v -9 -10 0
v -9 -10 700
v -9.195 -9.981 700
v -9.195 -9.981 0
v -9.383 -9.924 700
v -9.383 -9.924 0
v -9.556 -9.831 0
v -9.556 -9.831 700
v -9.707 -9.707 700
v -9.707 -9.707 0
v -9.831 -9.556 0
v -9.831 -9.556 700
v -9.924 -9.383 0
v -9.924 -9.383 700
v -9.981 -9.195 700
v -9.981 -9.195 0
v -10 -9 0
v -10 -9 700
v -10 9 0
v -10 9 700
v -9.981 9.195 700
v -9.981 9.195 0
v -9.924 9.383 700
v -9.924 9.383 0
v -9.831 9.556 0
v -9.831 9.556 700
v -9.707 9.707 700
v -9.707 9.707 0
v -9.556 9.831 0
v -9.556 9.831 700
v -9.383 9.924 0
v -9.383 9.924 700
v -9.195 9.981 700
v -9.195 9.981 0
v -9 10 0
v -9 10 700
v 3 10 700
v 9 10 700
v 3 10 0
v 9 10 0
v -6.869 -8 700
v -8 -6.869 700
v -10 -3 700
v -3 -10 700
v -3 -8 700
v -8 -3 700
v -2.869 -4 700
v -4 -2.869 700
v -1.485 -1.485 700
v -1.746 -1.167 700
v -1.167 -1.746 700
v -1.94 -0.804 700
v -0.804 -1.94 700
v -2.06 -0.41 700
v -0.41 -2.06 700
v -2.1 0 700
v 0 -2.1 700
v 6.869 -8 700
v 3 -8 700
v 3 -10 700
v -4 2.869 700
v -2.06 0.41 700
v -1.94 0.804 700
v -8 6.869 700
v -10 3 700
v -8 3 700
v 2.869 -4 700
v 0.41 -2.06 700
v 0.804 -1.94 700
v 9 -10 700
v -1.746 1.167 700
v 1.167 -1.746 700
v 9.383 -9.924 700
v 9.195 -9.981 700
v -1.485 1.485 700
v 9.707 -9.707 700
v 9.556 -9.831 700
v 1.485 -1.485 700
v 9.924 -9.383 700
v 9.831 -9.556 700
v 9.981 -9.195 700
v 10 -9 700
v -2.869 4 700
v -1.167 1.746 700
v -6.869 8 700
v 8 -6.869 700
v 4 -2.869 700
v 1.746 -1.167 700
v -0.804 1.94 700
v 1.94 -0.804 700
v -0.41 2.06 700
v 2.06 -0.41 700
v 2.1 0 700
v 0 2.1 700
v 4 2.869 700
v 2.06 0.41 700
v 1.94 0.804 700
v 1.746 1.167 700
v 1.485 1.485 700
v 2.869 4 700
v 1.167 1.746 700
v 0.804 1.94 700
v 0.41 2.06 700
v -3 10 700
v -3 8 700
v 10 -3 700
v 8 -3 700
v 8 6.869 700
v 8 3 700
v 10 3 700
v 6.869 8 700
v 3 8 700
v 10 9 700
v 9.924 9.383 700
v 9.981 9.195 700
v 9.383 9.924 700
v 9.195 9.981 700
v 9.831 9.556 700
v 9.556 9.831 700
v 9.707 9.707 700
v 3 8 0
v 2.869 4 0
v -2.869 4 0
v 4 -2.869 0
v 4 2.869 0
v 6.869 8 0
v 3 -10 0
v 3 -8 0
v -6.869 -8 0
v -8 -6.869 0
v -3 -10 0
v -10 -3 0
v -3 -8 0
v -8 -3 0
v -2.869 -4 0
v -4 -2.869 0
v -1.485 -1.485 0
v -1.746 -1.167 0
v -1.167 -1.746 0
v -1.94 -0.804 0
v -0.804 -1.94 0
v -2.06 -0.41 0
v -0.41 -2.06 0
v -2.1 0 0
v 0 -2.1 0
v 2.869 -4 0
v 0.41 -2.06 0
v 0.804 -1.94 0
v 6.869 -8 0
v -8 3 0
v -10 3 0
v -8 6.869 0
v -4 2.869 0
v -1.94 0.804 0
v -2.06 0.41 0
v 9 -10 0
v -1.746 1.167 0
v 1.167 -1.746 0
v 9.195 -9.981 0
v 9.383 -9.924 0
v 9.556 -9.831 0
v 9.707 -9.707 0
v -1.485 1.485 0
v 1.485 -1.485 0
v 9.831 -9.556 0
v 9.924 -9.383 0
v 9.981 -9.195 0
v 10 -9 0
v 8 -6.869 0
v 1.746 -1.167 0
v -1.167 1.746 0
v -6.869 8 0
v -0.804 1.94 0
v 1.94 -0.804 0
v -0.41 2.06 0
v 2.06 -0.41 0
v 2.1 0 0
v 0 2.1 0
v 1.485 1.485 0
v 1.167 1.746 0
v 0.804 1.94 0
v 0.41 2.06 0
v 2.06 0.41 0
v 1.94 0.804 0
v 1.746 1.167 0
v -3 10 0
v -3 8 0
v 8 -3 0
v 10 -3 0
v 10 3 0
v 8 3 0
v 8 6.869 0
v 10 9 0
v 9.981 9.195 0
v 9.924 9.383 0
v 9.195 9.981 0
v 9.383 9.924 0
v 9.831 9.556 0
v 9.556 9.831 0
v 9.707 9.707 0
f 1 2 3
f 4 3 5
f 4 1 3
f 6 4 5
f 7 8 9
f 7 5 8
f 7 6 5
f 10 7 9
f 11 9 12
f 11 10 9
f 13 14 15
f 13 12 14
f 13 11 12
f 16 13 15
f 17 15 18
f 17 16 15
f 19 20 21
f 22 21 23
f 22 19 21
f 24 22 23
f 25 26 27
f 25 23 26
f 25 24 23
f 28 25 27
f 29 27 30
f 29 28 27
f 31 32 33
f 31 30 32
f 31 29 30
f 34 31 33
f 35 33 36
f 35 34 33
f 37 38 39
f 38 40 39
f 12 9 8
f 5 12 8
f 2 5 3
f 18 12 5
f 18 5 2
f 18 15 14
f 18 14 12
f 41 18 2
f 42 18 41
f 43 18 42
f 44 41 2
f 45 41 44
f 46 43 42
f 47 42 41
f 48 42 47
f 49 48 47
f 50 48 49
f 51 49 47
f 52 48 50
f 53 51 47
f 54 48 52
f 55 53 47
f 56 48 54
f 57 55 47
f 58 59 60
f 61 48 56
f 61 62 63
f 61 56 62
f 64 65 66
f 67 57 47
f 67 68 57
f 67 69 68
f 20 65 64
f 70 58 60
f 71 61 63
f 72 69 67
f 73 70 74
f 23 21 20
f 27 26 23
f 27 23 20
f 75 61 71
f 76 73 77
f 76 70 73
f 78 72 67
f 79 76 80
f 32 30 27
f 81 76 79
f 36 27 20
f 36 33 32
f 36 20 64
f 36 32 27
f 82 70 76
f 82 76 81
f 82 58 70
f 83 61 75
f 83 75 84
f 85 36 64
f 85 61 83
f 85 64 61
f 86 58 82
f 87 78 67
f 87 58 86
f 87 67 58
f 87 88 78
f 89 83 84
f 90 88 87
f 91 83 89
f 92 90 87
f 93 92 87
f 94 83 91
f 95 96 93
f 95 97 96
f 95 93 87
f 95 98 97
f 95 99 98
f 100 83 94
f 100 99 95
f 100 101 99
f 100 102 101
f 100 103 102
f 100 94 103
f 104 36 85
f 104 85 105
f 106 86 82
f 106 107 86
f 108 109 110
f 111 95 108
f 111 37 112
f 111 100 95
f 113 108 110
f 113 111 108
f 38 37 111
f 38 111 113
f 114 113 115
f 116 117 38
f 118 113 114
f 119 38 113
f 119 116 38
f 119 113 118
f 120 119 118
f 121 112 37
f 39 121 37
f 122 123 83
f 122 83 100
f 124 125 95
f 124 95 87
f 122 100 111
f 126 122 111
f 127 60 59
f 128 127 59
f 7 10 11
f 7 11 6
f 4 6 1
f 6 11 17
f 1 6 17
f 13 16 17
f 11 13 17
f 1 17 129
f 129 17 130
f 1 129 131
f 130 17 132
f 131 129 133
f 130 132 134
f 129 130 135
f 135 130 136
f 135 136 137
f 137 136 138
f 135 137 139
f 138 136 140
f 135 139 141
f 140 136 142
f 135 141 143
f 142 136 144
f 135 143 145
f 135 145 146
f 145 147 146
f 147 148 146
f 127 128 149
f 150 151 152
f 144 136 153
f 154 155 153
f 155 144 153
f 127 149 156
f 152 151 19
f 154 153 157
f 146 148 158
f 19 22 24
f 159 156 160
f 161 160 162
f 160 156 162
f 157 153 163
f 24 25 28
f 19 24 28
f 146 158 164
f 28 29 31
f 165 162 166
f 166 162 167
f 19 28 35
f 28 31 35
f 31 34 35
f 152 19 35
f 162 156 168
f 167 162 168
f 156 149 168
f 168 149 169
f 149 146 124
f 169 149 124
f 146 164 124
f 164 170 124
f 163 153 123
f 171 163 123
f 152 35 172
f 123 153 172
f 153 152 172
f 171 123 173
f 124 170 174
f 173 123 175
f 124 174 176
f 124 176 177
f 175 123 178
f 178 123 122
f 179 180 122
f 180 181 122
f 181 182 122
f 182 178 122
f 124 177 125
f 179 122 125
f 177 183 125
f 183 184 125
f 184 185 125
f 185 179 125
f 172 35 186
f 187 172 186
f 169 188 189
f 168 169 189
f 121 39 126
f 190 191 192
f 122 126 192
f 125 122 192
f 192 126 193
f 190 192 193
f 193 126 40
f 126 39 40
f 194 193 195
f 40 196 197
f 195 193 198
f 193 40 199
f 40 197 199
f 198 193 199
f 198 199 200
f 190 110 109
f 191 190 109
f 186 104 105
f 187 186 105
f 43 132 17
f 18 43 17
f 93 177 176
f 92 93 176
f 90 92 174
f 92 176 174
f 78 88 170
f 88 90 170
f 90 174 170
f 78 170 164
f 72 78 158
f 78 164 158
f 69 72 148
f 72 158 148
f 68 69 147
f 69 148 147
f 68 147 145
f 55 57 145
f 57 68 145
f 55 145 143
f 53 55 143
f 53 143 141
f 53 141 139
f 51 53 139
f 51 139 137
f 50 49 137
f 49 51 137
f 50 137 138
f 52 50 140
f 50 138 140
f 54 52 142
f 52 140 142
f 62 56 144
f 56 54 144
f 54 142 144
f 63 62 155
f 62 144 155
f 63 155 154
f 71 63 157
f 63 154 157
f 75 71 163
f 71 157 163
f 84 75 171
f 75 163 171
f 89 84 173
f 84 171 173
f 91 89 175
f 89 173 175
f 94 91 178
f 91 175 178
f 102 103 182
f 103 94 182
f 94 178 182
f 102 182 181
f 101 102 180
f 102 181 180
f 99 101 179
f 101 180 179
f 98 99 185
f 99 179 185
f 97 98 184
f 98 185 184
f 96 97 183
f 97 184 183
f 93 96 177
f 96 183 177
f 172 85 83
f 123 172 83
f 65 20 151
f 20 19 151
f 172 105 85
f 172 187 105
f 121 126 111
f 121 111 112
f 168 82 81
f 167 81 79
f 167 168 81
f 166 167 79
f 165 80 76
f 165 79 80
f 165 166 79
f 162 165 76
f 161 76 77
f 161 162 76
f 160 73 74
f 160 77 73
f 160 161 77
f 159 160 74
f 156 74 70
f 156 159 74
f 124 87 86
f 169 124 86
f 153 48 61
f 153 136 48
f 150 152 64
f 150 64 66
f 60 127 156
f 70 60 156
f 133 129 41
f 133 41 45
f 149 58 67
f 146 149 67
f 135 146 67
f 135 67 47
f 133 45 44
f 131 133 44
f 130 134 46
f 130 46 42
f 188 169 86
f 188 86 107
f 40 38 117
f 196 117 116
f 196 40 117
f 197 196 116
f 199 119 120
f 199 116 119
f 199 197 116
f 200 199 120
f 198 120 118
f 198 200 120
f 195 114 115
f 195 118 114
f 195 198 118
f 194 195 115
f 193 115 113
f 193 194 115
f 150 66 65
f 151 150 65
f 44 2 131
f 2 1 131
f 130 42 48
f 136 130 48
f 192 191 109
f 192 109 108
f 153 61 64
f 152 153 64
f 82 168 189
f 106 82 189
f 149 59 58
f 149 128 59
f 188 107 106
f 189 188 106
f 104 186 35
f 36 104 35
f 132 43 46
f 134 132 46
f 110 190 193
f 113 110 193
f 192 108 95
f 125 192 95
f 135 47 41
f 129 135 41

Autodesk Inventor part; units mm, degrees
ref_plane "YZ Plane" through (0, 0, 0) normal (1, 0, 0) x (0, 1, 0)
ref_plane "XZ Plane" through (0, 0, 0) normal (0, 1, 0) x (-1, 0, 0)
ref_plane "XY Plane" through (0, 0, 0) normal (0, 0, 1) x (1, 0, 0)
sketch "スケッチ1" plane through (0, 0, 0) normal (0, 0, 1) x (1, 0, 0)
  line L0 (-10, -10) -> (10, 10) construction
  line L1 (10, -10) -> (-10, 10) construction
  line L2 (10, 3) -> (8, 3)
  line L3 (8, 3) -> (8, 6.8686)
  line L4 (8, 6.8686) -> (4, 2.8686)
  line L5 (4, 2.8686) -> (4, -2.8686)
  line L6 (4, -2.8686) -> (8, -6.8686)
  line L7 (8, -6.8686) -> (8, -3)
  line L8 (8, -3) -> (10, -3)
  line L9 (-10, 0) -> (10, 0) construction
  line L10 (-3, 10) -> (-3, 8)
  line L11 (-3, 8) -> (-6.8686, 8)
  line L12 (-6.8686, 8) -> (-2.8686, 4)
  line L13 (-2.8686, 4) -> (2.8686, 4)
  line L14 (3, 8) -> (3, 10)
  line L15 (2.8686, 4) -> (6.8686, 8)
  line L16 (6.8686, 8) -> (3, 8)
  line L17 (-10, -3) -> (-8, -3)
  line L18 (-8, -3) -> (-8, -6.8686)
  line L19 (-8, -6.8686) -> (-4, -2.8686)
  line L20 (-4, -2.8686) -> (-4, 2.8686)
  line L21 (-8, 3) -> (-10, 3)
  line L22 (-4, 2.8686) -> (-8, 6.8686)
  line L23 (-8, 6.8686) -> (-8, 3)
  line L24 (3, -10) -> (3, -8)
  line L25 (3, -8) -> (6.8686, -8)
  line L26 (6.8686, -8) -> (2.8686, -4)
  line L27 (2.8686, -4) -> (-2.8686, -4)
  line L28 (-3, -8) -> (-3, -10)
  line L29 (-2.8686, -4) -> (-6.8686, -8)
  line L30 (-6.8686, -8) -> (-3, -8)
  line L31 (9, 10) -> (3, 10)
  line L32 (-3, 10) -> (-9, 10)
  line L33 (-10, 9) -> (-10, 3)
  line L34 (-10, -3) -> (-10, -9)
  line L35 (-9, -10) -> (-3, -10)
  line L36 (3, -10) -> (9, -10)
  line L37 (10, -9) -> (10, -3)
  line L38 (10, 3) -> (10, 9)
  circle A0 centre (0, 0) radius 2.1
  arc A1 (-9, 10) -> (-10, 9) centre (-9, 9) ccw
  arc A2 (-10, -9) -> (-9, -10) centre (-9, -9) ccw
  arc A3 (9, -10) -> (10, -9) centre (9, -9) ccw
  arc A4 (10, 9) -> (9, 10) centre (9, 9) ccw
  point P0 (0, 10)
  point P1 (-10, 0)
  point P2 (0, -10)
  dimension "d0" = 2
  dimension "d1" = 6
  dimension "d2" = 4
  dimension "d3" = 0.8
  dimension "d9" = 20
  dimension "d10" = 4.2
  dimension "d11" = 1
extrude "押し出し1" add sketch "スケッチ1" along normal blind 700
properties part number "高剛性フレーム"
